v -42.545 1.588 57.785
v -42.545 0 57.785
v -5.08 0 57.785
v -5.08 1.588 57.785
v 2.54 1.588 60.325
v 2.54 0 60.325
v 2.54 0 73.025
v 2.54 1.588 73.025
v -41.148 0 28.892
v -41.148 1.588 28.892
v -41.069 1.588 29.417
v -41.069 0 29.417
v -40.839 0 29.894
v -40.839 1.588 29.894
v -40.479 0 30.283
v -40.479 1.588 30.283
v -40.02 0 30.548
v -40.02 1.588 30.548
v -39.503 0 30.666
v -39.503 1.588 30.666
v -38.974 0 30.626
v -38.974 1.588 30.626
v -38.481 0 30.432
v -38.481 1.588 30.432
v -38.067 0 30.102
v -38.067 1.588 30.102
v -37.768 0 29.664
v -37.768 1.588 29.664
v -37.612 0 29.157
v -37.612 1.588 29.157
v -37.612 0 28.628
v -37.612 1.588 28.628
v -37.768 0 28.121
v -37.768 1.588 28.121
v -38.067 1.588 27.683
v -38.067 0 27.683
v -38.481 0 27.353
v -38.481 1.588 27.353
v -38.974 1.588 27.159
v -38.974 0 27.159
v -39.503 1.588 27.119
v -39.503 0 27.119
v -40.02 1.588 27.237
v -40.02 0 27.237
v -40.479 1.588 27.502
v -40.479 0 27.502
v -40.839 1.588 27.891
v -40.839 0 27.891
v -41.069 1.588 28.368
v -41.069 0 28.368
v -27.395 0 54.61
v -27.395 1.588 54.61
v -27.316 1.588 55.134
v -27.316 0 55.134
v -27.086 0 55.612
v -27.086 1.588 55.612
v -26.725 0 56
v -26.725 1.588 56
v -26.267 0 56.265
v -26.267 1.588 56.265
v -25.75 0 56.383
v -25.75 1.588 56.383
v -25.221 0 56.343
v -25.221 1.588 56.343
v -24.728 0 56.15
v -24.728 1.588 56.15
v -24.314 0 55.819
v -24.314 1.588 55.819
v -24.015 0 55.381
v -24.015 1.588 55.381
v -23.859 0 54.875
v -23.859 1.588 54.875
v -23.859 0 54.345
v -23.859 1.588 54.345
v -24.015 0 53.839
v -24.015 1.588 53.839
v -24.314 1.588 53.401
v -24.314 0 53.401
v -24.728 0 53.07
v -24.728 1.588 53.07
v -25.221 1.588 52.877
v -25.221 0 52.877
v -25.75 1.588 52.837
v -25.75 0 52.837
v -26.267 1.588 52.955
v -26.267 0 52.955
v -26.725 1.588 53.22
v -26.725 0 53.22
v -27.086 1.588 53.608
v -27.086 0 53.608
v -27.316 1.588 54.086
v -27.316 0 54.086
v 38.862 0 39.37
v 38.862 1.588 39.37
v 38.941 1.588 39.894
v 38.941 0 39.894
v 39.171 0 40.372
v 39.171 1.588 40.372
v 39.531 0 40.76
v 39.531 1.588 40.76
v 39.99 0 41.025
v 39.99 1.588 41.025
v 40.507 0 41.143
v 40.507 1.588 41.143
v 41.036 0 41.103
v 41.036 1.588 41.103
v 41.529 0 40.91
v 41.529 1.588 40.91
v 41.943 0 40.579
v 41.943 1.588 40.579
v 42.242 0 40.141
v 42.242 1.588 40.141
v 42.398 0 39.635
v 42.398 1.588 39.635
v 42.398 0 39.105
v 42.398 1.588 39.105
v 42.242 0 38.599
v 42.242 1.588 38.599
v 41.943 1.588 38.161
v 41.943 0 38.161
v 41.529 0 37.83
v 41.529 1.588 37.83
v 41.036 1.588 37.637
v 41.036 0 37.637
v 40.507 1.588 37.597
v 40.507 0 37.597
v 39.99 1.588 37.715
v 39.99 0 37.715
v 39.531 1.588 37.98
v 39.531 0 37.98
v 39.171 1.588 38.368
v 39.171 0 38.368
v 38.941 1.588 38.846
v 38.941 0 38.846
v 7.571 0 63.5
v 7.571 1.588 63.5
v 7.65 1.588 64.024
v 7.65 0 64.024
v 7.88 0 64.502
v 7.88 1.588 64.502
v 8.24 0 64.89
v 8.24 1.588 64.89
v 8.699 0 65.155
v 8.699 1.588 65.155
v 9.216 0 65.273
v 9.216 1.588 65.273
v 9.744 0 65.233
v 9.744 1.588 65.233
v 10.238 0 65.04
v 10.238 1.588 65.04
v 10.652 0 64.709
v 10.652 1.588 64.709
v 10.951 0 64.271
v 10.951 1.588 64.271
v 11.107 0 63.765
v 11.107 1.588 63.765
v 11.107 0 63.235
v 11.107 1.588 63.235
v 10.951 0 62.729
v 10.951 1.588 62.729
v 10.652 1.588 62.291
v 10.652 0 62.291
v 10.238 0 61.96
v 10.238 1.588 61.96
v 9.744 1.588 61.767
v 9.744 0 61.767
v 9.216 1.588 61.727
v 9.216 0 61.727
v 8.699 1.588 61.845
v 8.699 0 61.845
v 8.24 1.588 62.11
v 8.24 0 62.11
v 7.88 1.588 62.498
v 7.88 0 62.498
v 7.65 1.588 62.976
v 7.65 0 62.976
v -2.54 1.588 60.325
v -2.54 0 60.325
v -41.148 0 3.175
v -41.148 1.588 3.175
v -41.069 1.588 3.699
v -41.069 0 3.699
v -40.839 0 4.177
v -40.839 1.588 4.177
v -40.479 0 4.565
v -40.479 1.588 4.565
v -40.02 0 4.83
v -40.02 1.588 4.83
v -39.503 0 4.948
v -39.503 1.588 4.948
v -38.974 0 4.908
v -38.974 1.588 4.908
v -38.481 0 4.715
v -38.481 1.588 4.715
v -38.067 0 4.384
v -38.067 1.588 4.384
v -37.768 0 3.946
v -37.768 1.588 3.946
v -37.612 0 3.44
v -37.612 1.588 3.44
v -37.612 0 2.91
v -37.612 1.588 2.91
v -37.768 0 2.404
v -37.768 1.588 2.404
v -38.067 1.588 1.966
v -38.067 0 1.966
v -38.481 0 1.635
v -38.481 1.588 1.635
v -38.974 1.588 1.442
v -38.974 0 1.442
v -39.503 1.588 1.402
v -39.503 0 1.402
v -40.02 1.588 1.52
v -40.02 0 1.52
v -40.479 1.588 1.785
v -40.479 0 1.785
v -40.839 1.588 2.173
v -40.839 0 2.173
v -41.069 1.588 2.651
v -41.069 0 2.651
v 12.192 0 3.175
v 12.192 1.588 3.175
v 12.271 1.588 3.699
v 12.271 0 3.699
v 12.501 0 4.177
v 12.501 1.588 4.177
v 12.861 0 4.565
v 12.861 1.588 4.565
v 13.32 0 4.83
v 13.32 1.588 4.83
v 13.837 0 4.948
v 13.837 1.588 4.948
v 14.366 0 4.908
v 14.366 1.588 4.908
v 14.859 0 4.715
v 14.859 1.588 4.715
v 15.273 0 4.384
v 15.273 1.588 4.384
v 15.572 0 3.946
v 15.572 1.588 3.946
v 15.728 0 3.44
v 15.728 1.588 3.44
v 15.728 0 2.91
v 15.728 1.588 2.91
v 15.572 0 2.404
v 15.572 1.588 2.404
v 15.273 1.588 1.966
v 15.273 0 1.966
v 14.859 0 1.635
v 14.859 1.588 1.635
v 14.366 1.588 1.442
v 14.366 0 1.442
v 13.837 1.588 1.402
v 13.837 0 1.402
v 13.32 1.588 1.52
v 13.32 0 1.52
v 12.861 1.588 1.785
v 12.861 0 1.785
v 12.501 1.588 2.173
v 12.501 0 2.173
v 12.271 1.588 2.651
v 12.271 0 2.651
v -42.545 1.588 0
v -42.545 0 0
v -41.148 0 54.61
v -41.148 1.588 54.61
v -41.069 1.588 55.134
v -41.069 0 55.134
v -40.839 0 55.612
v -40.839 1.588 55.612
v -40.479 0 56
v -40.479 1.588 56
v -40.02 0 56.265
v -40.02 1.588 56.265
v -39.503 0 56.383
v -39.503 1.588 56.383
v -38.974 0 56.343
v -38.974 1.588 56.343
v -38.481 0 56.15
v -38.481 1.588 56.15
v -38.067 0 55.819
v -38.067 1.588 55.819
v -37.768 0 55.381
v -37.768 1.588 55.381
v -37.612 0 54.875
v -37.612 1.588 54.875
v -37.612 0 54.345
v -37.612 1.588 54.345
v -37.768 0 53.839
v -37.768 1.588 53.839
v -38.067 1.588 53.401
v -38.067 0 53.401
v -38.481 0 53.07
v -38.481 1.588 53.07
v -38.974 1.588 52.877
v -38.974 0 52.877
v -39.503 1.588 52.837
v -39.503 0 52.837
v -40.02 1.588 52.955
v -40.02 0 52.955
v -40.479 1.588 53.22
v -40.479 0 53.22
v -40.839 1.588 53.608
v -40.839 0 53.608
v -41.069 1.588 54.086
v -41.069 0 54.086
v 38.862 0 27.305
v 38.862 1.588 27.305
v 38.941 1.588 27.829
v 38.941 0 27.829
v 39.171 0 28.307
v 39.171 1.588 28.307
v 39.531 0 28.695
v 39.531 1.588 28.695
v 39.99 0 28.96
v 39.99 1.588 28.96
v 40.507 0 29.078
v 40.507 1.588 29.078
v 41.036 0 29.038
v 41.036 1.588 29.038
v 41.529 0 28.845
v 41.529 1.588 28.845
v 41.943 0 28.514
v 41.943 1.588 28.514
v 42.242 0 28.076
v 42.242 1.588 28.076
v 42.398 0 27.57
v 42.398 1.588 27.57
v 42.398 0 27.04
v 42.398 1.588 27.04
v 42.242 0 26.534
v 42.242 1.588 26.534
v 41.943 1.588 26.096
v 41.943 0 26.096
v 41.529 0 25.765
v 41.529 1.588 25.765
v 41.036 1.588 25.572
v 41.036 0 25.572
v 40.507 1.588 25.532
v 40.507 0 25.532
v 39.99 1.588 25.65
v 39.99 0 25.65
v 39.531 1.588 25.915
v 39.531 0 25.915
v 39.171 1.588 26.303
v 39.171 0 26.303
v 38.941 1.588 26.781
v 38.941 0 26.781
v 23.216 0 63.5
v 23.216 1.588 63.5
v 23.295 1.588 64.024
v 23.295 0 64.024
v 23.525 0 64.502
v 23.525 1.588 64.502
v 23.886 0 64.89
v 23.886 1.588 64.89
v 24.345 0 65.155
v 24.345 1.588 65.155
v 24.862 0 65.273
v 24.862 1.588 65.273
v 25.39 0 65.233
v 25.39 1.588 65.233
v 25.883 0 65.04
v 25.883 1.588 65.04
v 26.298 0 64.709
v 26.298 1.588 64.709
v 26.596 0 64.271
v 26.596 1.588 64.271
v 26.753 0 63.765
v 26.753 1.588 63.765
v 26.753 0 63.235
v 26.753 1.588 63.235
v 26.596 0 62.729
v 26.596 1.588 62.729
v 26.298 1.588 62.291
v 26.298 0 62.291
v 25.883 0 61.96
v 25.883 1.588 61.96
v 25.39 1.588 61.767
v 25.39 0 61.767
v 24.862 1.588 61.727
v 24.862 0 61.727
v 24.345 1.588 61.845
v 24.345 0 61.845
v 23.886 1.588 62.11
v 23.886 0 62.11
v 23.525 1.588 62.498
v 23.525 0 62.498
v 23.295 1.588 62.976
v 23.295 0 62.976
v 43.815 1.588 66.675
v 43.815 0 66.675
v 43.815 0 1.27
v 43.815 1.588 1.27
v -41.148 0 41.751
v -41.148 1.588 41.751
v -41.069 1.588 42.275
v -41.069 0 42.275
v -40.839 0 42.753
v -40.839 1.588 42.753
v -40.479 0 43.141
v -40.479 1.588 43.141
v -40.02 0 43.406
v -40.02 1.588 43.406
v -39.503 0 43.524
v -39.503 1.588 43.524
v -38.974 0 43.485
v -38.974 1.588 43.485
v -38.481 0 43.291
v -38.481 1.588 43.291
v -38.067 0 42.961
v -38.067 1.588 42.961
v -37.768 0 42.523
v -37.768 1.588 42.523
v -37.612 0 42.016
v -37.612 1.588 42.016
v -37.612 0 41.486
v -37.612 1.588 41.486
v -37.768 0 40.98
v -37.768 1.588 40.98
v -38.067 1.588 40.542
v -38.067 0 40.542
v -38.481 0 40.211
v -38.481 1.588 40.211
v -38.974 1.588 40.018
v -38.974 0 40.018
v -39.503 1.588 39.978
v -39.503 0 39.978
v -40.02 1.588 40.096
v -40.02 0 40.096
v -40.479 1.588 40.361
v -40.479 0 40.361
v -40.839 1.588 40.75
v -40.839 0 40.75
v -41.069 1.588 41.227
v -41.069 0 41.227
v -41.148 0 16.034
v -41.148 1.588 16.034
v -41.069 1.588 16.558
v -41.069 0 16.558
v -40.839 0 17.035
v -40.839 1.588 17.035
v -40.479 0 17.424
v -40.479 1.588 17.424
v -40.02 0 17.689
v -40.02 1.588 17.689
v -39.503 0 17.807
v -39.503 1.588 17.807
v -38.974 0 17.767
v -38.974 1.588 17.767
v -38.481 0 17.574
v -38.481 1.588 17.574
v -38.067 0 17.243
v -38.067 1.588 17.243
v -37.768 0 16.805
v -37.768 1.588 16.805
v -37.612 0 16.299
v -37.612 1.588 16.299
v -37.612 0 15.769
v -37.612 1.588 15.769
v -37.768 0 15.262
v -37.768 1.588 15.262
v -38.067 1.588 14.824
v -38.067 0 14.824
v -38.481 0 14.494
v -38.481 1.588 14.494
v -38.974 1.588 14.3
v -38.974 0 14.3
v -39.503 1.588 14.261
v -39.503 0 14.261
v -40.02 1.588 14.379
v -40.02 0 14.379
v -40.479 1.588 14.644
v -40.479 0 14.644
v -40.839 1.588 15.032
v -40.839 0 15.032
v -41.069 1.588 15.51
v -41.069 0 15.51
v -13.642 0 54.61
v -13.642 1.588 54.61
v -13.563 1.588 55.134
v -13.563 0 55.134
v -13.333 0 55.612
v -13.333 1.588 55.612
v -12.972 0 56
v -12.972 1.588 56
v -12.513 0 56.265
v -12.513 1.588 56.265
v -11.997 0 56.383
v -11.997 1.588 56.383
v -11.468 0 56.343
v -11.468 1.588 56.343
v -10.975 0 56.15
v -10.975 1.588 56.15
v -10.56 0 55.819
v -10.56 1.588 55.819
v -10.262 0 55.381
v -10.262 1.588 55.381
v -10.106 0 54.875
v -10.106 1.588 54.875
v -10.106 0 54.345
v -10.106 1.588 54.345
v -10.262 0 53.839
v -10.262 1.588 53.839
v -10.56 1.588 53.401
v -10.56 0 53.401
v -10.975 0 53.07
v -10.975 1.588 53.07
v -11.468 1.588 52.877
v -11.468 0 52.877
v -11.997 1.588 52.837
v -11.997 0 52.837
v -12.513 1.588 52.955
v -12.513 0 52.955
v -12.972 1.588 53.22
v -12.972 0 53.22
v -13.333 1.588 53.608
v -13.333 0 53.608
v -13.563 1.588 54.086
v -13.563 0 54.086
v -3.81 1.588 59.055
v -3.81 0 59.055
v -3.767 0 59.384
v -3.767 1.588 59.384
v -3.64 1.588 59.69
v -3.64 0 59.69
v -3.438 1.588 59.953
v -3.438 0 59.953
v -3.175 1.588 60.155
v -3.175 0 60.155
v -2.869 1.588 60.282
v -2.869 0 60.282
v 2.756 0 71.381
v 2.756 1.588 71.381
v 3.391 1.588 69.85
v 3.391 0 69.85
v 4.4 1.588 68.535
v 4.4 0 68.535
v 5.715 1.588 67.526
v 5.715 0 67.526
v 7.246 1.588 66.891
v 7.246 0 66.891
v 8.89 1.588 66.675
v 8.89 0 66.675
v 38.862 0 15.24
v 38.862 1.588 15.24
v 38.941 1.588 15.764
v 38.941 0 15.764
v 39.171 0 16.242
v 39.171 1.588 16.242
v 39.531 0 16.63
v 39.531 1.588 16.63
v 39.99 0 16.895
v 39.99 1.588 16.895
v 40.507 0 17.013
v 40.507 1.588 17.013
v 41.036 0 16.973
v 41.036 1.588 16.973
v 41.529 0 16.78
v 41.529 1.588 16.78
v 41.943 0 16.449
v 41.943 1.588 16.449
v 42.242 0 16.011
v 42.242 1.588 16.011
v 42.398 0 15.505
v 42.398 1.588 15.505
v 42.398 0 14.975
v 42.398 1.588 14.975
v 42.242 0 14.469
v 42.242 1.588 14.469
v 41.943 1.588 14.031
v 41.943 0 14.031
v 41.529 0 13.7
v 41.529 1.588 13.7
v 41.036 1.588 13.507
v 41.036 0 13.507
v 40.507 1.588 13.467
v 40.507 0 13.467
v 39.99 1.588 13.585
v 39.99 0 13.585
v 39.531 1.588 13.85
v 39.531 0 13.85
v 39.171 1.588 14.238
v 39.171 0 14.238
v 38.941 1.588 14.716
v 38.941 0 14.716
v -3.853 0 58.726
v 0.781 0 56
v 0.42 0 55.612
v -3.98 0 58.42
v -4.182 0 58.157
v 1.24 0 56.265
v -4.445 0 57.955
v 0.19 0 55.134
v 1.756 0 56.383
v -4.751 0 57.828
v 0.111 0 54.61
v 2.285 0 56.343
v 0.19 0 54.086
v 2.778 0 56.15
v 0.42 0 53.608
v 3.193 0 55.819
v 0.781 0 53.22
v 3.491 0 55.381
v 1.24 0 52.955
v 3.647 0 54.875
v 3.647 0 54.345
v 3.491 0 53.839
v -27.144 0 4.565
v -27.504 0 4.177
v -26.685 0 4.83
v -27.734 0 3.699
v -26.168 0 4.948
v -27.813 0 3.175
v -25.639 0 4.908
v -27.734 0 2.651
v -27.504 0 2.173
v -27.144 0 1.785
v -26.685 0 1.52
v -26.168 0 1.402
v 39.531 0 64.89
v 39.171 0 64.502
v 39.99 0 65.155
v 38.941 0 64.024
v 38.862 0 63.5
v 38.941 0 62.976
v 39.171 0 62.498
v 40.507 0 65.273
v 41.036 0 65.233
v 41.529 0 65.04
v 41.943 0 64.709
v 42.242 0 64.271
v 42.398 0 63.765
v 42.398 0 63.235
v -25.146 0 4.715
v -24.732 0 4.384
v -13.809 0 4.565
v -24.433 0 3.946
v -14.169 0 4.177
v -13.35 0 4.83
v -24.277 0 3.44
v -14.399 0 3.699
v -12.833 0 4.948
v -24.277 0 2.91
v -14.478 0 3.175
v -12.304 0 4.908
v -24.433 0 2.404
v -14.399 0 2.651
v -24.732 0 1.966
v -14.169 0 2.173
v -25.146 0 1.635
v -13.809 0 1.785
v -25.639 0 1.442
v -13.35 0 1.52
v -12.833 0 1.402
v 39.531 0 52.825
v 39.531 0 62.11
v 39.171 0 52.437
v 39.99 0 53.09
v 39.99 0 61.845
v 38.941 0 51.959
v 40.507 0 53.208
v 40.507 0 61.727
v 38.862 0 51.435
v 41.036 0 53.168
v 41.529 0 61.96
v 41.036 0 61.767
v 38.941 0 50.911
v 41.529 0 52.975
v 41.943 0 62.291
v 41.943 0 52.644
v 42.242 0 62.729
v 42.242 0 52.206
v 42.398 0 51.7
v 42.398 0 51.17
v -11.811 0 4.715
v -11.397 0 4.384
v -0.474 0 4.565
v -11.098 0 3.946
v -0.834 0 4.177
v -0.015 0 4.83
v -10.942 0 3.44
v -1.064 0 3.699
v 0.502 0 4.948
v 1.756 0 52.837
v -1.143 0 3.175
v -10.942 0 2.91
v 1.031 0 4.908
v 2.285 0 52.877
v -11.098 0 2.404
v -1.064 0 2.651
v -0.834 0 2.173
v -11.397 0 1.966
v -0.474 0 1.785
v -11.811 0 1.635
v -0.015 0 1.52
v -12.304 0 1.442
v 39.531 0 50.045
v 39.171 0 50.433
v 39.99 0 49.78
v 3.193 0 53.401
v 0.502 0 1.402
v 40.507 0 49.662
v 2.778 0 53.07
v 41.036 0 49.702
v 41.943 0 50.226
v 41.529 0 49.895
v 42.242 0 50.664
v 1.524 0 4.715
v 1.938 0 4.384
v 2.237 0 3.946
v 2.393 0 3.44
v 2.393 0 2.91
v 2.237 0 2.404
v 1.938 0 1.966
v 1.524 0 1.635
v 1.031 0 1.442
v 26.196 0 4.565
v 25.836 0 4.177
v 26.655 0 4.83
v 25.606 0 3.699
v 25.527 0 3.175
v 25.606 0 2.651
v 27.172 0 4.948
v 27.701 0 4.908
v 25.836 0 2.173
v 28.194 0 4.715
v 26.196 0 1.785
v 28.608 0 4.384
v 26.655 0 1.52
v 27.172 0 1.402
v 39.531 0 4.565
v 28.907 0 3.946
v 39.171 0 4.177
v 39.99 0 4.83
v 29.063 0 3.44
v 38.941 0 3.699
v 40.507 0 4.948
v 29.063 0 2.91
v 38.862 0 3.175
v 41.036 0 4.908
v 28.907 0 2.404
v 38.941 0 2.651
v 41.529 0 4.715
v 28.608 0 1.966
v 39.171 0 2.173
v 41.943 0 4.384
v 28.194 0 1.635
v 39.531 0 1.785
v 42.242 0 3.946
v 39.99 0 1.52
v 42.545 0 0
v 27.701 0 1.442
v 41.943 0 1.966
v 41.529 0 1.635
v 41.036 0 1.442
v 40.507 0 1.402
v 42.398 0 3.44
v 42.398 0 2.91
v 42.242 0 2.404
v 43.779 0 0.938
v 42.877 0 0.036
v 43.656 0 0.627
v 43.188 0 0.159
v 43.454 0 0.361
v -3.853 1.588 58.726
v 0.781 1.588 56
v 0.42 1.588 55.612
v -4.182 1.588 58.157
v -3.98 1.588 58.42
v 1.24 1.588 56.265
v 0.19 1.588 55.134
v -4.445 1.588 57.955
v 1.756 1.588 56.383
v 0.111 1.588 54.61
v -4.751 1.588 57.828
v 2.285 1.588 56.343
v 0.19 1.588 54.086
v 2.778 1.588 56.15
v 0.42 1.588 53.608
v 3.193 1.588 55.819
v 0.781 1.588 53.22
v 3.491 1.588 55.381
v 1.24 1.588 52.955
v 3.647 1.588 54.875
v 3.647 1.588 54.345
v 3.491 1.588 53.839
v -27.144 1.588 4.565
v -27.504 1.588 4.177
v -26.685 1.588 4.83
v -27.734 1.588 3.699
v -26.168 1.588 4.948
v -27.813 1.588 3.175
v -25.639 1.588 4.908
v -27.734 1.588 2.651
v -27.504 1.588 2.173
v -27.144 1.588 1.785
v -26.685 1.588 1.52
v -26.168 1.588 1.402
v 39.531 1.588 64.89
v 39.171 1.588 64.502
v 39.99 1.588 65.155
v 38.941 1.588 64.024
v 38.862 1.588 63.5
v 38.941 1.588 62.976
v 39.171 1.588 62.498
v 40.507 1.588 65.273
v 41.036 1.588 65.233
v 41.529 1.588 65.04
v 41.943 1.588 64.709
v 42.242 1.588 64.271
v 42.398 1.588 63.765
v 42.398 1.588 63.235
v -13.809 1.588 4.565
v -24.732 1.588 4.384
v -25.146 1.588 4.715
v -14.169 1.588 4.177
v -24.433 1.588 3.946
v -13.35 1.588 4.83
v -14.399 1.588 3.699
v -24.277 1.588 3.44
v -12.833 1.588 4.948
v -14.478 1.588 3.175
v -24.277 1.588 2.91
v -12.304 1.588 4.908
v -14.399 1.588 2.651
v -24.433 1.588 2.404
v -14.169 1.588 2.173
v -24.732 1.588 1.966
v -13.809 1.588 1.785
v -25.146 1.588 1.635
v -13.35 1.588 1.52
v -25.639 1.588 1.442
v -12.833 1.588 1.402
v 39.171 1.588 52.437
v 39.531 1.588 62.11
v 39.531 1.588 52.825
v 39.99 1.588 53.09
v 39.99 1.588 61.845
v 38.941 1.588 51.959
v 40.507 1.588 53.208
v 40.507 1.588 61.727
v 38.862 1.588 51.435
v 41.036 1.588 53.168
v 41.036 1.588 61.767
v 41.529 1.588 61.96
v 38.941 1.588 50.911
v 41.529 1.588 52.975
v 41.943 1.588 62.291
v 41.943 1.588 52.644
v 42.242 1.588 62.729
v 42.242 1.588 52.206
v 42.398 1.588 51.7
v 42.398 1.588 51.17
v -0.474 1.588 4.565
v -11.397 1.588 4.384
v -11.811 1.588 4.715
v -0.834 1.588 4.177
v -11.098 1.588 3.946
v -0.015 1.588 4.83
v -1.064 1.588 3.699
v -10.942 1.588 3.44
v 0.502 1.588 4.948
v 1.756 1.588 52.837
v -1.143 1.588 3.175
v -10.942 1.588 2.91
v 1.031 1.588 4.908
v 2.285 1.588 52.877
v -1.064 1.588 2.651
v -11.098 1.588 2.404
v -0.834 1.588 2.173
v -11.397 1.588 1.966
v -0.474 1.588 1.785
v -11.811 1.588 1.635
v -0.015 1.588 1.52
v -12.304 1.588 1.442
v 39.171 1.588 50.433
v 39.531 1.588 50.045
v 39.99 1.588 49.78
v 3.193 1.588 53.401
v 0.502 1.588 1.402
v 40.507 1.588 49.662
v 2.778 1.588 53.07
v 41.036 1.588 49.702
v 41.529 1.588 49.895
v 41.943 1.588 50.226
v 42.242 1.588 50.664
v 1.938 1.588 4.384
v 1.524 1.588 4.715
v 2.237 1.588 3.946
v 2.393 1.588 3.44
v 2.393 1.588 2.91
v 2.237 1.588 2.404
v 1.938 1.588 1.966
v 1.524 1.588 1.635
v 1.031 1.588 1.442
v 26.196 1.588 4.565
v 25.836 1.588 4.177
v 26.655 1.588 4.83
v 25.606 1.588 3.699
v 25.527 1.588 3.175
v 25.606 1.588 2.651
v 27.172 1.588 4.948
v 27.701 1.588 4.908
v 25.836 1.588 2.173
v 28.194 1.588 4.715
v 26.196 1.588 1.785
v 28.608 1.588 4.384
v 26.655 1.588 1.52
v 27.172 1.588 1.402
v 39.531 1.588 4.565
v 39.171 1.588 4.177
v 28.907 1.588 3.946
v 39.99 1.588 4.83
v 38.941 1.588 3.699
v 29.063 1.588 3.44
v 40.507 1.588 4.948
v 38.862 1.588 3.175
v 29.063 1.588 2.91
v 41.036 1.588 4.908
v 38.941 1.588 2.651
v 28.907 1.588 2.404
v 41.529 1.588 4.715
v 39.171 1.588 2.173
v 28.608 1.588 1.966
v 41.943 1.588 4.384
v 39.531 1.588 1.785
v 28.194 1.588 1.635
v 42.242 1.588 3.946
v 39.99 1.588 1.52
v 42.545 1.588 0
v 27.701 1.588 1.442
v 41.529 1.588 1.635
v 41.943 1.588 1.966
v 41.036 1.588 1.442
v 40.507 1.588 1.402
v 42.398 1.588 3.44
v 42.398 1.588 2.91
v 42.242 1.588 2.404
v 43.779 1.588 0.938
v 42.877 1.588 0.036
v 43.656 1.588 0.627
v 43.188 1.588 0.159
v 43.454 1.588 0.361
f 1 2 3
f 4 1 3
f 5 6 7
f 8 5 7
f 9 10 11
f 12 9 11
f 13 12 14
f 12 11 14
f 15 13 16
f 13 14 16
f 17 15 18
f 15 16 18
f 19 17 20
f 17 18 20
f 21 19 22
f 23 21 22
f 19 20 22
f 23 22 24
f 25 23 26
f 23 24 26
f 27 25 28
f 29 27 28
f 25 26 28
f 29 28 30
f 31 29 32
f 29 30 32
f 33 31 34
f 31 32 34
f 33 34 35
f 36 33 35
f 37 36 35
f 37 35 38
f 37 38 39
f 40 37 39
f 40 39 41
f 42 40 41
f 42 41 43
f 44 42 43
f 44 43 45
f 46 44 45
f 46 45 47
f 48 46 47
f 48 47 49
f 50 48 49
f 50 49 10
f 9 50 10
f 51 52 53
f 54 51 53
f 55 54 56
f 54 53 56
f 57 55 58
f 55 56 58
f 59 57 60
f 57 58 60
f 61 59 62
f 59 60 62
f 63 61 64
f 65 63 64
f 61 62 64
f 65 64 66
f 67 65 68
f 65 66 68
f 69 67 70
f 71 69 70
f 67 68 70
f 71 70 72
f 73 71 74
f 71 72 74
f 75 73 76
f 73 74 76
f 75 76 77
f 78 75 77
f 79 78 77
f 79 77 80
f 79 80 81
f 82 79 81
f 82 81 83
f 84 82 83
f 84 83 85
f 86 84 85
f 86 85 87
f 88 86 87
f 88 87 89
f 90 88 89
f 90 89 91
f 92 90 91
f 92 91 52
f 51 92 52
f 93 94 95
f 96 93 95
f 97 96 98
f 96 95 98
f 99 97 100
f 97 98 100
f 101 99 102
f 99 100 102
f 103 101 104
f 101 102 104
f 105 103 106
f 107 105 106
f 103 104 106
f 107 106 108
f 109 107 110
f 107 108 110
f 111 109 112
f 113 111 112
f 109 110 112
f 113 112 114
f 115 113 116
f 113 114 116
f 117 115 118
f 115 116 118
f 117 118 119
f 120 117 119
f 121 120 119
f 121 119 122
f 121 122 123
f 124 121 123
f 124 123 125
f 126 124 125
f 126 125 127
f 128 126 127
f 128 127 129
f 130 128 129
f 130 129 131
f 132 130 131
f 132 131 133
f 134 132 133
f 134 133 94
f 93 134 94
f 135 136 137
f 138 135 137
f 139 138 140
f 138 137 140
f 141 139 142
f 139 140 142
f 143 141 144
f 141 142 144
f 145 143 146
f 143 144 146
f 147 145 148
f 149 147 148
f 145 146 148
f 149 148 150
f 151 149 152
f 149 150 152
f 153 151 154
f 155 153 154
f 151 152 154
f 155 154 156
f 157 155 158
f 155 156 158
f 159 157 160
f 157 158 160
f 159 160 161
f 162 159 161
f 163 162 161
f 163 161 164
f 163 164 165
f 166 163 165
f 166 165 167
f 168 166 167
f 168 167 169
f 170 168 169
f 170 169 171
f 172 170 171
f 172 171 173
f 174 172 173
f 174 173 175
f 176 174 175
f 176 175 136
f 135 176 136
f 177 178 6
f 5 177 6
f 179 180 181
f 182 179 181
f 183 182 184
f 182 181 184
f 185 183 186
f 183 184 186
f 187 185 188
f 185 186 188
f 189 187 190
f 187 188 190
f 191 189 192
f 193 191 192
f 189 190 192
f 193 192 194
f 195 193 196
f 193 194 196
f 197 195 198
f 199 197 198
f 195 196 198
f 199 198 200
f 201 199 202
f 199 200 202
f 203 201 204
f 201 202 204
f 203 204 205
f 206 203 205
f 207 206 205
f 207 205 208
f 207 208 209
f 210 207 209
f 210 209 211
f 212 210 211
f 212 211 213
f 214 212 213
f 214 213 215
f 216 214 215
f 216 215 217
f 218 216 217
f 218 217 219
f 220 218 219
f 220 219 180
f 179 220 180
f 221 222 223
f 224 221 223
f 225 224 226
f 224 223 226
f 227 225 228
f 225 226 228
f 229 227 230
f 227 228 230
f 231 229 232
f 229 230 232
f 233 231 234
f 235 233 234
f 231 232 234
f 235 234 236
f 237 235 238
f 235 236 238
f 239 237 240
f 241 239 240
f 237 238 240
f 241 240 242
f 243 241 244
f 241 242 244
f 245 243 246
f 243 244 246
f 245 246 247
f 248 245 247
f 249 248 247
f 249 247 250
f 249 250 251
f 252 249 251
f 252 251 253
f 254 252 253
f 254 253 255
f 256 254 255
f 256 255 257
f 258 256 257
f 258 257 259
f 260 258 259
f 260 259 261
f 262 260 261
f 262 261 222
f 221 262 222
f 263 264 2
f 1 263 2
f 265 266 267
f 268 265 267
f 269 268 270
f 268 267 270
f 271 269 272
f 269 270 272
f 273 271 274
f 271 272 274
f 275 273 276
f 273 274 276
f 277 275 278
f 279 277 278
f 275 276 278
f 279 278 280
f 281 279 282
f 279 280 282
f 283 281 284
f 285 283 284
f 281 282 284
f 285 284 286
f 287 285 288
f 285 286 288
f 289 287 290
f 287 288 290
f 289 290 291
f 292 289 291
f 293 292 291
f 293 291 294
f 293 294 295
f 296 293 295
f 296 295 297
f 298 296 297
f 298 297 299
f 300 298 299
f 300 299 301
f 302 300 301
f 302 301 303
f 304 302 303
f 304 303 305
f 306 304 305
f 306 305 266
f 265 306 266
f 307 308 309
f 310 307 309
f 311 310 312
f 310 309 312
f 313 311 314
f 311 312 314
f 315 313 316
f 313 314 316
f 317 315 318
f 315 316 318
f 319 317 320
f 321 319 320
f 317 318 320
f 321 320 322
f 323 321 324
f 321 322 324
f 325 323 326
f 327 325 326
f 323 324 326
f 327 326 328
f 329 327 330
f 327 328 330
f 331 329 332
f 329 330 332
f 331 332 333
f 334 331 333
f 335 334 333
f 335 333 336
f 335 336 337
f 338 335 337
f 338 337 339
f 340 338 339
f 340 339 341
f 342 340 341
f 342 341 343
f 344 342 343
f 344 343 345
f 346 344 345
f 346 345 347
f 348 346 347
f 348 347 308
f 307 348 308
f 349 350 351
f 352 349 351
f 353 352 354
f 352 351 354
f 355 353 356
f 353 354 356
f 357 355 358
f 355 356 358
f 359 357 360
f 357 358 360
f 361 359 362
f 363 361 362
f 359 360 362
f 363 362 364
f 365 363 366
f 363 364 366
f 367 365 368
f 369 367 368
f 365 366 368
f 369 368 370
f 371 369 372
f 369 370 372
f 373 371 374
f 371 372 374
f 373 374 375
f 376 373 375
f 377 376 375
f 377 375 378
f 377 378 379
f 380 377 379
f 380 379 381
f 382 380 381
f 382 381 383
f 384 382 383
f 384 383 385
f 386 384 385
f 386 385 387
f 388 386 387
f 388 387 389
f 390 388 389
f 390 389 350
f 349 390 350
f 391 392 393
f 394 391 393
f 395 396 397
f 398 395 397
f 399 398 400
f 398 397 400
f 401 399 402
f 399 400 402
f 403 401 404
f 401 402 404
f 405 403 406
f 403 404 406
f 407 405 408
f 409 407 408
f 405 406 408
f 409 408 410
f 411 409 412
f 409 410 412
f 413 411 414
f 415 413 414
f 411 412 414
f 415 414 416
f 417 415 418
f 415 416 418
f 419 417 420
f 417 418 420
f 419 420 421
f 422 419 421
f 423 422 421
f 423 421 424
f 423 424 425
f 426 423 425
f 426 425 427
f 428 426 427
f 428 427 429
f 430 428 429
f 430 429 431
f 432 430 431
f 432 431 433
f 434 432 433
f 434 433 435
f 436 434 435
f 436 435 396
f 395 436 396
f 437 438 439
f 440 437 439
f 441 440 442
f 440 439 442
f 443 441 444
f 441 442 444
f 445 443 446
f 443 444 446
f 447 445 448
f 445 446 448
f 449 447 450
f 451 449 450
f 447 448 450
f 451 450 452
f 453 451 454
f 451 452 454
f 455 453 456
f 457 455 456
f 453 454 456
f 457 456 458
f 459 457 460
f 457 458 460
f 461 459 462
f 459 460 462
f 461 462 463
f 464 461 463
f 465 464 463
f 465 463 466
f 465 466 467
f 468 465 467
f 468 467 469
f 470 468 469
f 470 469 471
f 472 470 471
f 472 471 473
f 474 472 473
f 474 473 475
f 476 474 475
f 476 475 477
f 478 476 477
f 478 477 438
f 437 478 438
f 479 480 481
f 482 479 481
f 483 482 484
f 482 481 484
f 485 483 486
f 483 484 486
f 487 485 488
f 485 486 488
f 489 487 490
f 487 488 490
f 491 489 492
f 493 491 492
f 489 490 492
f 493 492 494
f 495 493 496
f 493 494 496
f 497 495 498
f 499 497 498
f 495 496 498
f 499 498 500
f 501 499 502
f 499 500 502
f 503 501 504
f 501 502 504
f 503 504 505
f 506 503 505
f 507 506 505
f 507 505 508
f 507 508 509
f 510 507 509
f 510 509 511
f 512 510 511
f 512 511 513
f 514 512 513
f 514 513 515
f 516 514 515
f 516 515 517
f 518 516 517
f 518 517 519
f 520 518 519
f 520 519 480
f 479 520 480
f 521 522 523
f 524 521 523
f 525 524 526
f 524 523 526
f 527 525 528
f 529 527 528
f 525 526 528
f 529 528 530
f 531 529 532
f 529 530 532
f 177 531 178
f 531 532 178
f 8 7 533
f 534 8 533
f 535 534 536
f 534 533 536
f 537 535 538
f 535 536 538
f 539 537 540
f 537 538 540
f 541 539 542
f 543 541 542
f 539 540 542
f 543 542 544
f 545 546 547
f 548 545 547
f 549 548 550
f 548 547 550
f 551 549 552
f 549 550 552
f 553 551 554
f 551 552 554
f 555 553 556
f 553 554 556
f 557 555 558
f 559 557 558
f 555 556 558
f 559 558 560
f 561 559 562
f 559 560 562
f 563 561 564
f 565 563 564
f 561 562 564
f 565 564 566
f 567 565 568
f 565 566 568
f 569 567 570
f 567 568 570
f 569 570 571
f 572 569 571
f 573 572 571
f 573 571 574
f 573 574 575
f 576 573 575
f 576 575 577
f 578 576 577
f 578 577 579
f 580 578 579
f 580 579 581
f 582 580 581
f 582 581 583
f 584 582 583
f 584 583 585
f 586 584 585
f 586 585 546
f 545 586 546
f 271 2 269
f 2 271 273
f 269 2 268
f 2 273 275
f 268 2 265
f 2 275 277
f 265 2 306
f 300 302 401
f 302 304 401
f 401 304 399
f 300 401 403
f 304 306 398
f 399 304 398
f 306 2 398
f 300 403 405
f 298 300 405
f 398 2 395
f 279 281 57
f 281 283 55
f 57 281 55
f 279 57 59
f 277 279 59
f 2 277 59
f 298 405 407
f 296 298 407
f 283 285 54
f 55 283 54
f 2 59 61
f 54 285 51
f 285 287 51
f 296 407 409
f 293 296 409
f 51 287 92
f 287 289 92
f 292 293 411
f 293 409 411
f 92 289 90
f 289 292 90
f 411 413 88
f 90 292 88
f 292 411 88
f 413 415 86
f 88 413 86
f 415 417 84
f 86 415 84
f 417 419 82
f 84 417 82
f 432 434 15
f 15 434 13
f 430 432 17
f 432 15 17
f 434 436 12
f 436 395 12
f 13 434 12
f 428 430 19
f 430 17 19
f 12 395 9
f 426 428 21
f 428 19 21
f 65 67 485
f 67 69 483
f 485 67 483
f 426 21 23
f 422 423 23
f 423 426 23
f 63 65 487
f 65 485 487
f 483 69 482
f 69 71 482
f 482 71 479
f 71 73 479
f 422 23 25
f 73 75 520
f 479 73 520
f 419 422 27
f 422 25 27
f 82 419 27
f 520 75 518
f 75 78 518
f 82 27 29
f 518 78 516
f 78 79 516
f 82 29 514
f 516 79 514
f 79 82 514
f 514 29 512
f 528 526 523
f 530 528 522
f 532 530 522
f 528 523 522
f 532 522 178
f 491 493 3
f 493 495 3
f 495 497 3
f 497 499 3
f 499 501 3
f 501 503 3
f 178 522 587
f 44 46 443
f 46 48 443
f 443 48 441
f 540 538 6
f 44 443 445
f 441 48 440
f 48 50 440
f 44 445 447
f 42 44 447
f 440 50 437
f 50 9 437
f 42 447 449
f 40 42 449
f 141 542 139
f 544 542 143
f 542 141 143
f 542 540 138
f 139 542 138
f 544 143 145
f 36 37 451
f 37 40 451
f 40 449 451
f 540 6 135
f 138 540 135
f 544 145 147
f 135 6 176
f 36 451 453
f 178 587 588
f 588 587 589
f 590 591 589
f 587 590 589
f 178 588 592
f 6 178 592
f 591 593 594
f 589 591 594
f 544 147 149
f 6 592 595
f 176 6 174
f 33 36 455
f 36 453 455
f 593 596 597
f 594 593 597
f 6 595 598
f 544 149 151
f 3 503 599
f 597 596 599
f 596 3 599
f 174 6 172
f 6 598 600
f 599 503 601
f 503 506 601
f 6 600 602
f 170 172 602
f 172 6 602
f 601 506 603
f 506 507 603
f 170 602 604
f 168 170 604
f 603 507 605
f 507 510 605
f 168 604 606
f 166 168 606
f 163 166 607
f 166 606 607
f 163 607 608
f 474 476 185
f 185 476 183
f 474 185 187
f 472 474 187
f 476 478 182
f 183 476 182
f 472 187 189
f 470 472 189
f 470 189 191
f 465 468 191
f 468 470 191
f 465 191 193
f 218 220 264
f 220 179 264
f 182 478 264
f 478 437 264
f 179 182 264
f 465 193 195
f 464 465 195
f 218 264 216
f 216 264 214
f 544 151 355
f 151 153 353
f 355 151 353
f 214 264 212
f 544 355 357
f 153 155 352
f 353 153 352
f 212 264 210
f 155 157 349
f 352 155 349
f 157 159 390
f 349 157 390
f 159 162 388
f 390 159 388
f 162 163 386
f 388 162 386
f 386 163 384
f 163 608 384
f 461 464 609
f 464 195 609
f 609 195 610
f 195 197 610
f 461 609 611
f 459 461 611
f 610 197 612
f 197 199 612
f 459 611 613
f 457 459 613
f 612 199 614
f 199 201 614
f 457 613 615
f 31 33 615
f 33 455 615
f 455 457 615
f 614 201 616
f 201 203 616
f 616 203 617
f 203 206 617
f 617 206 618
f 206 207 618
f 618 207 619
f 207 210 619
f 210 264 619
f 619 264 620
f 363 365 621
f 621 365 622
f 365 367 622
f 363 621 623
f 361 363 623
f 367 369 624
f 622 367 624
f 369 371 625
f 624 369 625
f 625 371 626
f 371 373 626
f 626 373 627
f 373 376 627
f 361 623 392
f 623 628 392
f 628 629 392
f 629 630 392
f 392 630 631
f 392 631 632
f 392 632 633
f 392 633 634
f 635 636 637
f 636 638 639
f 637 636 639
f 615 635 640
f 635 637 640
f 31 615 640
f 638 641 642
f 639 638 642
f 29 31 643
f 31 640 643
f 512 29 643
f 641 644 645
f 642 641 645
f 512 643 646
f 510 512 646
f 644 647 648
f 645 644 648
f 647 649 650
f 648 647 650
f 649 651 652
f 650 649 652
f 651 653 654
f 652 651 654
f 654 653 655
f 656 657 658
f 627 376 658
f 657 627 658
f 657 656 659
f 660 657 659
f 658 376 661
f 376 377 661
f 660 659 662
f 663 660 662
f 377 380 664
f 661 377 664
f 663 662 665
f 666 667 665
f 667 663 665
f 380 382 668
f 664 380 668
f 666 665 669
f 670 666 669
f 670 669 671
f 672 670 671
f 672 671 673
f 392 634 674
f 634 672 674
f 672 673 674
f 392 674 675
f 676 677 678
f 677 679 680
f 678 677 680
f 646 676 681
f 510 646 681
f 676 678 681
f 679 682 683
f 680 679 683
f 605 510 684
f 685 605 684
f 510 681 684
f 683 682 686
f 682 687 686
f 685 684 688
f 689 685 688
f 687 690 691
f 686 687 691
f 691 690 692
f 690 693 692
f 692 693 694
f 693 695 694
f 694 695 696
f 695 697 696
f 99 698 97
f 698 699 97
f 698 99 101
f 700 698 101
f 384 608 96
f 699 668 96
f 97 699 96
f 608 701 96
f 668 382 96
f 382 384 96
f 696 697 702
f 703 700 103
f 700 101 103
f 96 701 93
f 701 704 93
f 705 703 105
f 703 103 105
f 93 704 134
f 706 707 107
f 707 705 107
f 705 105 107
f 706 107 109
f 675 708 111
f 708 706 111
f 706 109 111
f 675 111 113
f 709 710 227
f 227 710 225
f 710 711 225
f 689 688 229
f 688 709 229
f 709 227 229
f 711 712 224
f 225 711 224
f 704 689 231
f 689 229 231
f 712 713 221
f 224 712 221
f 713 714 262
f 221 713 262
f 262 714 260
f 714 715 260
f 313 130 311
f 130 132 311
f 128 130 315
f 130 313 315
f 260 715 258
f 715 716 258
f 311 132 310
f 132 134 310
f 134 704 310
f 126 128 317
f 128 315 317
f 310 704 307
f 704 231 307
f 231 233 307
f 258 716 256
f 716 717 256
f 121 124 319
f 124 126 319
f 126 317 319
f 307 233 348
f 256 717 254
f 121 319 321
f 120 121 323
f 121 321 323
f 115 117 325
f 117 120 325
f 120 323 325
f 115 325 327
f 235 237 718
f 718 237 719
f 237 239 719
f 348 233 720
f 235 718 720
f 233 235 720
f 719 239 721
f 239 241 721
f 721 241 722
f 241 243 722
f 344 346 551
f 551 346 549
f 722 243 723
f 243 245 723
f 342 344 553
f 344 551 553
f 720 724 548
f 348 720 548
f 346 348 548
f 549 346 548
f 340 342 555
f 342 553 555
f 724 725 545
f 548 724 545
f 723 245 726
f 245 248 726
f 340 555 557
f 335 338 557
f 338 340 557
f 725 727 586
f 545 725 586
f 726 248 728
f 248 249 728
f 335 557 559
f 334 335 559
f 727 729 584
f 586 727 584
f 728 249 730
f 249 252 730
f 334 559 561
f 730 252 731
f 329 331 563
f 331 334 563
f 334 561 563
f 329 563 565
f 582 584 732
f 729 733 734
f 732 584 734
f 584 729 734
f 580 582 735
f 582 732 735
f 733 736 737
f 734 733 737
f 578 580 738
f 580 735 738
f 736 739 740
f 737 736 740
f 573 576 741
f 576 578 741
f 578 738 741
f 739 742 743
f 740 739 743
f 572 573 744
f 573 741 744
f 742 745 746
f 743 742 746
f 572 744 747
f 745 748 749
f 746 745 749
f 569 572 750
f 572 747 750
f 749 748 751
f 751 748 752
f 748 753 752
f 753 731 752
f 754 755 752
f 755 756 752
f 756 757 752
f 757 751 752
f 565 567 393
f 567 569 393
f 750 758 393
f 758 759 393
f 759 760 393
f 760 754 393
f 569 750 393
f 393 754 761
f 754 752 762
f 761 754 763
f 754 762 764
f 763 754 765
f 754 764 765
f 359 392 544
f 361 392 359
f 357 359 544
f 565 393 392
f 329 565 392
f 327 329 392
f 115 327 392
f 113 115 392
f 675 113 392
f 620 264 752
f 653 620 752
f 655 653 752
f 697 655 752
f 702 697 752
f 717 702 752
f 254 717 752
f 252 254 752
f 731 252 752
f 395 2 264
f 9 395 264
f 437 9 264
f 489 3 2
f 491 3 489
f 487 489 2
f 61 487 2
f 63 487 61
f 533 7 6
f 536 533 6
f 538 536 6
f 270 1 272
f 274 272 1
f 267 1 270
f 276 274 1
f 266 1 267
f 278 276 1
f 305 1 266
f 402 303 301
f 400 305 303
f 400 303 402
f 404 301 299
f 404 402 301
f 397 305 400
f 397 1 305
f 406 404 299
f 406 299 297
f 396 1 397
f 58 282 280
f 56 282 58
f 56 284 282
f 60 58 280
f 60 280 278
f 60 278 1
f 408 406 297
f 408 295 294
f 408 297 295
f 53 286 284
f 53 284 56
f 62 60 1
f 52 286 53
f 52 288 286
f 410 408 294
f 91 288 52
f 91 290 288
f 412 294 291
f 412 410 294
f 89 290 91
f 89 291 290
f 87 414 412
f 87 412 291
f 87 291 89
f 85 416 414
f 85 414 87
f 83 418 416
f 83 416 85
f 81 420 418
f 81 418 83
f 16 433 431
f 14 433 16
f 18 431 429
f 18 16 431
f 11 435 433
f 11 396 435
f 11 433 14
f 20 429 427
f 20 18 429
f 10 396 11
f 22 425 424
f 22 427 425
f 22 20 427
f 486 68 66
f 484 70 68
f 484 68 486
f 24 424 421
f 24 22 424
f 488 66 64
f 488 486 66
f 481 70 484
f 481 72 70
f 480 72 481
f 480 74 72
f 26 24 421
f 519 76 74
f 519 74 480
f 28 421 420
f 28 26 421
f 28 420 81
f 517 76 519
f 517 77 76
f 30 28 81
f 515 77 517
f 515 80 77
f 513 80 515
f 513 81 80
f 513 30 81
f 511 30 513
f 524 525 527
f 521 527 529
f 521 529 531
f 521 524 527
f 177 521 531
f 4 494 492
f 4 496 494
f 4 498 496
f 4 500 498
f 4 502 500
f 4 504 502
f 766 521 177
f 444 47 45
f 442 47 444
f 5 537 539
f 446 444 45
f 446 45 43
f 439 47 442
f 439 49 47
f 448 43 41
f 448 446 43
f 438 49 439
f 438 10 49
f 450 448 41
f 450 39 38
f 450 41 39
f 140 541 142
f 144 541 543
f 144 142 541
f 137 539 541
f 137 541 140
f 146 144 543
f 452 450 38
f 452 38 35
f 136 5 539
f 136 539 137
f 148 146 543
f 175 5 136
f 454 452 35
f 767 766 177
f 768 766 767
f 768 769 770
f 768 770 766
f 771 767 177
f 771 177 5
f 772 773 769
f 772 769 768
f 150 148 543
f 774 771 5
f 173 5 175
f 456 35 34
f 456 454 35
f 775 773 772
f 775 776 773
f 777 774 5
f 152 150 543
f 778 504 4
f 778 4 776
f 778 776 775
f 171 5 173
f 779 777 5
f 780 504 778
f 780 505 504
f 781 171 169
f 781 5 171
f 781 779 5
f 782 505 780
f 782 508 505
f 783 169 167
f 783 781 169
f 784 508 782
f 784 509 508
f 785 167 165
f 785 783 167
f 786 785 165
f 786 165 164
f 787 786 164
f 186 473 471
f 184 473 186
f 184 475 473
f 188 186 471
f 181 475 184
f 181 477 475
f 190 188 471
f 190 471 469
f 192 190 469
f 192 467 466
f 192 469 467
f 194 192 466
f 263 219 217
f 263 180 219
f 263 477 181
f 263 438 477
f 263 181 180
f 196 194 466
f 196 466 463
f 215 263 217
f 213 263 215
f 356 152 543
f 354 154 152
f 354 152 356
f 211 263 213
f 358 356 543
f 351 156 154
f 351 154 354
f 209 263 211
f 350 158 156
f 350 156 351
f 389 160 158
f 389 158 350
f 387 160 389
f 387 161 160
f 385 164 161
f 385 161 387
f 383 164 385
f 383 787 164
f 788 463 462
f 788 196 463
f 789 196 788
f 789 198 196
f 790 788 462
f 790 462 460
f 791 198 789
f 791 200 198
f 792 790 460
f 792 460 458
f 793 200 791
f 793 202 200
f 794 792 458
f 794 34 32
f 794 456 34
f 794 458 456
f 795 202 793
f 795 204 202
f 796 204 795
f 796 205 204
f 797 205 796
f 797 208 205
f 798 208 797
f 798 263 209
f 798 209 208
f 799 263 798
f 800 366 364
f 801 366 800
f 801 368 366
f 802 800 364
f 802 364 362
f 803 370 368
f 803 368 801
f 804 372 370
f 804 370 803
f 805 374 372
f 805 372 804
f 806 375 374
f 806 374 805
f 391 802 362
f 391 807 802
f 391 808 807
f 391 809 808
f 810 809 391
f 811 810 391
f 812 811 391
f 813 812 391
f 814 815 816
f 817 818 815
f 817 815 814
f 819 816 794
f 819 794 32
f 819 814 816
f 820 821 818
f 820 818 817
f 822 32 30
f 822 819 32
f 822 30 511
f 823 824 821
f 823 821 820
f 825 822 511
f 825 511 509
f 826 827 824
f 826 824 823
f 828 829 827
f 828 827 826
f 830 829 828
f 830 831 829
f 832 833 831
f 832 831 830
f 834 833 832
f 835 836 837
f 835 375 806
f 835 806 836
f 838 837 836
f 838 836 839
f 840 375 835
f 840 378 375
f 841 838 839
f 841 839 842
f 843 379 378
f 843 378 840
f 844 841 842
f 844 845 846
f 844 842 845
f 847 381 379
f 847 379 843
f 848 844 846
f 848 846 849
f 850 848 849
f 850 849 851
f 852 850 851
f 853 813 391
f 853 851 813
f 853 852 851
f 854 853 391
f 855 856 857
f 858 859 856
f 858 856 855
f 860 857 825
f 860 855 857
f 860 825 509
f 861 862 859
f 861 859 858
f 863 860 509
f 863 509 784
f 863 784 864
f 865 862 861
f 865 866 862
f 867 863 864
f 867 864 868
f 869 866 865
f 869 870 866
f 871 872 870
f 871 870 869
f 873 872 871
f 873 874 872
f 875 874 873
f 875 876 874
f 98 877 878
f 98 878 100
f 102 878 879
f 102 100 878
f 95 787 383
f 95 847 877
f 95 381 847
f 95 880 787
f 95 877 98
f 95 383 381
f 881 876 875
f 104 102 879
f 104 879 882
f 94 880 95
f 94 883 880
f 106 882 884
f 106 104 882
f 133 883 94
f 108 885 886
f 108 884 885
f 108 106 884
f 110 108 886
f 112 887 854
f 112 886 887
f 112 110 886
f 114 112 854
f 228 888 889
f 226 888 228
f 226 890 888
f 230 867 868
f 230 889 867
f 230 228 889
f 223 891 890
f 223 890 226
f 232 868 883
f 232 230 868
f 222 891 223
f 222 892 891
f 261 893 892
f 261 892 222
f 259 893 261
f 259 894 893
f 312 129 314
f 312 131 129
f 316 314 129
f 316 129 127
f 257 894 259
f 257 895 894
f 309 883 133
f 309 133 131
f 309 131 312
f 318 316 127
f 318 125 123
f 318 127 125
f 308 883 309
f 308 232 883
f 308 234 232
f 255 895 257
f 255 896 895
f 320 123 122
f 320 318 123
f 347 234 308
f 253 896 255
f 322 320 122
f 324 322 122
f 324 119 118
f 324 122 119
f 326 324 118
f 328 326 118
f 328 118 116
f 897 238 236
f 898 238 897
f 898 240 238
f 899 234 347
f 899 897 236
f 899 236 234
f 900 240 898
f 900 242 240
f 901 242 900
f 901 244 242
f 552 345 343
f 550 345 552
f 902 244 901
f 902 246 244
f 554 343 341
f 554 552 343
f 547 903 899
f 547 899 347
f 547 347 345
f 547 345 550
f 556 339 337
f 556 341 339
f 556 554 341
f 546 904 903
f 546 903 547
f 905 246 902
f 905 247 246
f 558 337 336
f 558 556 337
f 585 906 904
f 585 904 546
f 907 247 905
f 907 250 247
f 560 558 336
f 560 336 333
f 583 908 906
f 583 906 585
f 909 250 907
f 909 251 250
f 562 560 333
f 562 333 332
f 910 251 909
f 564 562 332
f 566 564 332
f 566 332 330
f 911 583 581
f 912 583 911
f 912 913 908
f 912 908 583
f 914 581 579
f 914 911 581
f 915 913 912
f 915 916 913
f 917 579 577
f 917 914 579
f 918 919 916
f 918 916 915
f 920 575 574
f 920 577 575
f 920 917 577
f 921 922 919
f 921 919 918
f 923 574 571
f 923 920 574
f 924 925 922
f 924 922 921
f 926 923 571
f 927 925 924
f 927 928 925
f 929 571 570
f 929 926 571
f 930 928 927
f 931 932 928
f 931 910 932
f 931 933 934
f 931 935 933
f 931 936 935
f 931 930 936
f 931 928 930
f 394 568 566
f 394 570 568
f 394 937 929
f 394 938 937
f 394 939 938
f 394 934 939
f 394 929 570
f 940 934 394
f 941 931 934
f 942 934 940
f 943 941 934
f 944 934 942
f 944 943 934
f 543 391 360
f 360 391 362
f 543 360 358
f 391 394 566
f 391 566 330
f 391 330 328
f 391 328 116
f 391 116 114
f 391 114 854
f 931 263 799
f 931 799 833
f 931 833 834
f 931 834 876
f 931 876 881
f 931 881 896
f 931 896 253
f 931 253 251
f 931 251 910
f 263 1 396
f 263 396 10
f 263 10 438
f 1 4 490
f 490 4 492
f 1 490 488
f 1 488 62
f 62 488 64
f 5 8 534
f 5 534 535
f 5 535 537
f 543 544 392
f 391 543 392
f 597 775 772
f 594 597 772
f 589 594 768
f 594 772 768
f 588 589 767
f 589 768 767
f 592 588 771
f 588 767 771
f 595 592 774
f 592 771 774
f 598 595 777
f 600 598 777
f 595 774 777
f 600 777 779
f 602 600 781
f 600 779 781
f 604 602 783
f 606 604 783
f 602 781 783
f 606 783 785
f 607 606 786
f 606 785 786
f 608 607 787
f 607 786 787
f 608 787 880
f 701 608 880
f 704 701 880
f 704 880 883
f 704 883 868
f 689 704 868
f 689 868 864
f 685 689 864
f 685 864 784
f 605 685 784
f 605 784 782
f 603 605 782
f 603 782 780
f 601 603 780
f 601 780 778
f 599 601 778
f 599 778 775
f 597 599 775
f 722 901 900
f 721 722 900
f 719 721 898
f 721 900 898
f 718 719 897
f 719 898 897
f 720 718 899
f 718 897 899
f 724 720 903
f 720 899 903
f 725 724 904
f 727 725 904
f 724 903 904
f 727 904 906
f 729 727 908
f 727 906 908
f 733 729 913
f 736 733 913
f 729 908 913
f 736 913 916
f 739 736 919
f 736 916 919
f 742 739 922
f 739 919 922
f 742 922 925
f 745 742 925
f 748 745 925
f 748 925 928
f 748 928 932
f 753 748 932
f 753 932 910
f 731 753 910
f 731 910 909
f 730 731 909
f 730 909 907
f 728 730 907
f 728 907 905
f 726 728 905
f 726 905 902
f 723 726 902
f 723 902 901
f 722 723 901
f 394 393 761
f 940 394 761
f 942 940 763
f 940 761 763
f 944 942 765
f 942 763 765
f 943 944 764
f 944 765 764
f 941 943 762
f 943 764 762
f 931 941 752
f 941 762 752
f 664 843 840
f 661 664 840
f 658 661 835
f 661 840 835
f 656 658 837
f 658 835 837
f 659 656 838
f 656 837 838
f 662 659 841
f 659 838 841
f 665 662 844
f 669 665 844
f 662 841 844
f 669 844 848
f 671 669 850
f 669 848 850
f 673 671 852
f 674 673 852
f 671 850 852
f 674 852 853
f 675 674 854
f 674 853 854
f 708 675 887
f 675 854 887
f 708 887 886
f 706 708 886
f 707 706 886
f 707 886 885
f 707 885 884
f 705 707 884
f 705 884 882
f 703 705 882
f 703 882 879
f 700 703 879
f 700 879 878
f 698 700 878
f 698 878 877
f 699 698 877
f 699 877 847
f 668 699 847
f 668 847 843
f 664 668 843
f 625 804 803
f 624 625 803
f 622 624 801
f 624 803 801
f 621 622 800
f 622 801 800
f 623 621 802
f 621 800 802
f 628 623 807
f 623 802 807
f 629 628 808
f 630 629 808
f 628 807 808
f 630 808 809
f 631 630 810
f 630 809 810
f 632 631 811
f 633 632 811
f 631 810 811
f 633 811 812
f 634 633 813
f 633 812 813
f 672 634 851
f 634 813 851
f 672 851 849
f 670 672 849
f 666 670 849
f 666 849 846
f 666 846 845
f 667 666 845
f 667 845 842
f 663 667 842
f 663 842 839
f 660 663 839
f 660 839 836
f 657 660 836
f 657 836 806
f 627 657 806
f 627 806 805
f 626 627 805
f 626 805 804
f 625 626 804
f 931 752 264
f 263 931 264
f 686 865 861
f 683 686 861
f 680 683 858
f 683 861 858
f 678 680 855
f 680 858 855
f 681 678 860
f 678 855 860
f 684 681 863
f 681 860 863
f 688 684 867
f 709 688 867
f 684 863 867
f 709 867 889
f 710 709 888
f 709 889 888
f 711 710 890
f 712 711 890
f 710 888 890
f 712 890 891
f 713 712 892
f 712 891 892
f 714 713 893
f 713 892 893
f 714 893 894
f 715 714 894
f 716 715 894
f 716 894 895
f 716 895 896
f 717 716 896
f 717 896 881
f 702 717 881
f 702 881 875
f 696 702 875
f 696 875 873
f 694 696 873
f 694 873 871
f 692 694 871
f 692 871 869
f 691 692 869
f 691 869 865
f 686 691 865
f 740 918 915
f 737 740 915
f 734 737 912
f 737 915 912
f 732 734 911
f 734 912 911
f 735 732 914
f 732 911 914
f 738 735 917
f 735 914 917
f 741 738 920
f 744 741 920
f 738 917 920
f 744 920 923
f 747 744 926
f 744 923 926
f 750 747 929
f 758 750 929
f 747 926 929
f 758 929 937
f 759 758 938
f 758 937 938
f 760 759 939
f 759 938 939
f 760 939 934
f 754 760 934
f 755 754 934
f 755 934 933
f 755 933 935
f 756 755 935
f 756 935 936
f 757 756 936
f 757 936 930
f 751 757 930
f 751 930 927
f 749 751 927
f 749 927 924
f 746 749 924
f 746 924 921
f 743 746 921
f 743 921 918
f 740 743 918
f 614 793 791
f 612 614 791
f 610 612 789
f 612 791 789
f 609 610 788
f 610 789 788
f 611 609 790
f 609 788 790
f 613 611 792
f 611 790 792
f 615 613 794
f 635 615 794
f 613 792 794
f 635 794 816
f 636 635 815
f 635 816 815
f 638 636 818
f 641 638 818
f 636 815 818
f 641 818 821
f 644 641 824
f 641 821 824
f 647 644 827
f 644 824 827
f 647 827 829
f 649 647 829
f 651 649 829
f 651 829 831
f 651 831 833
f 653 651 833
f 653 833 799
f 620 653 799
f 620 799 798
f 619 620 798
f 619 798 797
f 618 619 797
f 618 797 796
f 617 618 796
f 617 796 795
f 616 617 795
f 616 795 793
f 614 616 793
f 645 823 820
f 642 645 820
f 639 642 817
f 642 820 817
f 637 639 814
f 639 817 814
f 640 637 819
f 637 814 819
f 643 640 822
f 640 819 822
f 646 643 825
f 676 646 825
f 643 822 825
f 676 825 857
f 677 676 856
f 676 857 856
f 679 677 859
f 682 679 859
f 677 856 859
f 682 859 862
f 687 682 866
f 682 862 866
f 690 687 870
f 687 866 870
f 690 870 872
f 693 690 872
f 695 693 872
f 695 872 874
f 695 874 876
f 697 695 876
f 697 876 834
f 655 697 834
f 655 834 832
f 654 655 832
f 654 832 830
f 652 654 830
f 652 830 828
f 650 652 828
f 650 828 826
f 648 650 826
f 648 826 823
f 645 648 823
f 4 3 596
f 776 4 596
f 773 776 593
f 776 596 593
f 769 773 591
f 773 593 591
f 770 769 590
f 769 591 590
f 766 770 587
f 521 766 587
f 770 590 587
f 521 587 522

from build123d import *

# Parameters (mm, degrees)
BOSS_EXTRUDE1_DEPTH     = 1.5875
SKETCH2_R               = 1.778
CUT_EXTRUDE1_DEPTH      = 1
CUT_EXTRUDE1_DEPTH_BACK = 2.5875


with BuildPart() as part:
    # Sketch1 → Boss-Extrude1 (new body)
    with BuildSketch(Plane(origin=(0, 0, 0), x_dir=(1, 0, 0), z_dir=(0, 1, 0))):
        with BuildLine():
            Line((8.89, -66.675), (43.815, -66.675))
            Line((43.815, -66.675), (43.815, -1.27))
            ThreePointArc((43.815, -1.27), (43.453523156, -0.361476844), (42.545, 0))
            Line((42.545, 0), (-42.545, 0))
            Line((-42.545, 0), (-42.545, -57.785))
            Line((-42.545, -57.785), (-5.08, -57.785))
            ThreePointArc((-5.08, -57.785), (-4.181974388, -58.156974388), (-3.81, -59.055))
            ThreePointArc((-3.81, -59.055), (-3.438025612, -59.953025612), (-2.54, -60.325))
            Line((-2.54, -60.325), (2.54, -60.325))
            Line((2.54, -60.325), (2.54, -73.025))
            ThreePointArc((2.54, -73.025), (4.399871939, -68.534871939), (8.89, -66.675))
        make_face()
    extrude(amount=BOSS_EXTRUDE1_DEPTH)

    # Sketch2 → Cut-Extrude1 (cut, two sides)
    with BuildSketch(Plane(origin=(0, 1.5875, 0), x_dir=(-1, 0, 0), z_dir=(0, 1, 0))) as cut_extrude1_sk:
        with Locations((39.37, 3.175)):
            Circle(SKETCH2_R)
        with Locations((26.035, 3.175)):
            Circle(SKETCH2_R)
        with Locations((12.7, 3.175)):
            Circle(SKETCH2_R)
        with Locations((-0.635, 3.175)):
            Circle(SKETCH2_R)
        with Locations((-13.97, 3.175)):
            Circle(SKETCH2_R)
        with Locations((-27.305, 3.175)):
            Circle(SKETCH2_R)
        with Locations((-40.64, 3.175)):
            Circle(SKETCH2_R)
        with Locations((39.37, 16.03375)):
            Circle(SKETCH2_R)
        with Locations((39.37, 28.8925)):
            Circle(SKETCH2_R)
        with Locations((39.37, 41.75125)):
            Circle(SKETCH2_R)
        with Locations((-40.64, 15.24)):
            Circle(SKETCH2_R)
        with Locations((-40.64, 27.305)):
            Circle(SKETCH2_R)
        with Locations((-40.64, 39.37)):
            Circle(SKETCH2_R)
        with Locations((-40.64, 51.435)):
            Circle(SKETCH2_R)
        with Locations((-40.64, 63.5)):
            Circle(SKETCH2_R)
        with Locations((-24.994404736, 63.5)):
            Circle(SKETCH2_R)
        with Locations((-9.348809473, 63.5)):
            Circle(SKETCH2_R)
        with Locations((-1.889213751, 54.61)):
            Circle(SKETCH2_R)
        with Locations((11.863857499, 54.61)):
            Circle(SKETCH2_R)
        with Locations((25.61692875, 54.61)):
            Circle(SKETCH2_R)
        with Locations((39.37, 54.61)):
            Circle(SKETCH2_R)
    extrude(amount=CUT_EXTRUDE1_DEPTH, mode=Mode.SUBTRACT)
    extrude(cut_extrude1_sk.sketch, amount=-CUT_EXTRUDE1_DEPTH_BACK, mode=Mode.SUBTRACT)


solid = part.part
